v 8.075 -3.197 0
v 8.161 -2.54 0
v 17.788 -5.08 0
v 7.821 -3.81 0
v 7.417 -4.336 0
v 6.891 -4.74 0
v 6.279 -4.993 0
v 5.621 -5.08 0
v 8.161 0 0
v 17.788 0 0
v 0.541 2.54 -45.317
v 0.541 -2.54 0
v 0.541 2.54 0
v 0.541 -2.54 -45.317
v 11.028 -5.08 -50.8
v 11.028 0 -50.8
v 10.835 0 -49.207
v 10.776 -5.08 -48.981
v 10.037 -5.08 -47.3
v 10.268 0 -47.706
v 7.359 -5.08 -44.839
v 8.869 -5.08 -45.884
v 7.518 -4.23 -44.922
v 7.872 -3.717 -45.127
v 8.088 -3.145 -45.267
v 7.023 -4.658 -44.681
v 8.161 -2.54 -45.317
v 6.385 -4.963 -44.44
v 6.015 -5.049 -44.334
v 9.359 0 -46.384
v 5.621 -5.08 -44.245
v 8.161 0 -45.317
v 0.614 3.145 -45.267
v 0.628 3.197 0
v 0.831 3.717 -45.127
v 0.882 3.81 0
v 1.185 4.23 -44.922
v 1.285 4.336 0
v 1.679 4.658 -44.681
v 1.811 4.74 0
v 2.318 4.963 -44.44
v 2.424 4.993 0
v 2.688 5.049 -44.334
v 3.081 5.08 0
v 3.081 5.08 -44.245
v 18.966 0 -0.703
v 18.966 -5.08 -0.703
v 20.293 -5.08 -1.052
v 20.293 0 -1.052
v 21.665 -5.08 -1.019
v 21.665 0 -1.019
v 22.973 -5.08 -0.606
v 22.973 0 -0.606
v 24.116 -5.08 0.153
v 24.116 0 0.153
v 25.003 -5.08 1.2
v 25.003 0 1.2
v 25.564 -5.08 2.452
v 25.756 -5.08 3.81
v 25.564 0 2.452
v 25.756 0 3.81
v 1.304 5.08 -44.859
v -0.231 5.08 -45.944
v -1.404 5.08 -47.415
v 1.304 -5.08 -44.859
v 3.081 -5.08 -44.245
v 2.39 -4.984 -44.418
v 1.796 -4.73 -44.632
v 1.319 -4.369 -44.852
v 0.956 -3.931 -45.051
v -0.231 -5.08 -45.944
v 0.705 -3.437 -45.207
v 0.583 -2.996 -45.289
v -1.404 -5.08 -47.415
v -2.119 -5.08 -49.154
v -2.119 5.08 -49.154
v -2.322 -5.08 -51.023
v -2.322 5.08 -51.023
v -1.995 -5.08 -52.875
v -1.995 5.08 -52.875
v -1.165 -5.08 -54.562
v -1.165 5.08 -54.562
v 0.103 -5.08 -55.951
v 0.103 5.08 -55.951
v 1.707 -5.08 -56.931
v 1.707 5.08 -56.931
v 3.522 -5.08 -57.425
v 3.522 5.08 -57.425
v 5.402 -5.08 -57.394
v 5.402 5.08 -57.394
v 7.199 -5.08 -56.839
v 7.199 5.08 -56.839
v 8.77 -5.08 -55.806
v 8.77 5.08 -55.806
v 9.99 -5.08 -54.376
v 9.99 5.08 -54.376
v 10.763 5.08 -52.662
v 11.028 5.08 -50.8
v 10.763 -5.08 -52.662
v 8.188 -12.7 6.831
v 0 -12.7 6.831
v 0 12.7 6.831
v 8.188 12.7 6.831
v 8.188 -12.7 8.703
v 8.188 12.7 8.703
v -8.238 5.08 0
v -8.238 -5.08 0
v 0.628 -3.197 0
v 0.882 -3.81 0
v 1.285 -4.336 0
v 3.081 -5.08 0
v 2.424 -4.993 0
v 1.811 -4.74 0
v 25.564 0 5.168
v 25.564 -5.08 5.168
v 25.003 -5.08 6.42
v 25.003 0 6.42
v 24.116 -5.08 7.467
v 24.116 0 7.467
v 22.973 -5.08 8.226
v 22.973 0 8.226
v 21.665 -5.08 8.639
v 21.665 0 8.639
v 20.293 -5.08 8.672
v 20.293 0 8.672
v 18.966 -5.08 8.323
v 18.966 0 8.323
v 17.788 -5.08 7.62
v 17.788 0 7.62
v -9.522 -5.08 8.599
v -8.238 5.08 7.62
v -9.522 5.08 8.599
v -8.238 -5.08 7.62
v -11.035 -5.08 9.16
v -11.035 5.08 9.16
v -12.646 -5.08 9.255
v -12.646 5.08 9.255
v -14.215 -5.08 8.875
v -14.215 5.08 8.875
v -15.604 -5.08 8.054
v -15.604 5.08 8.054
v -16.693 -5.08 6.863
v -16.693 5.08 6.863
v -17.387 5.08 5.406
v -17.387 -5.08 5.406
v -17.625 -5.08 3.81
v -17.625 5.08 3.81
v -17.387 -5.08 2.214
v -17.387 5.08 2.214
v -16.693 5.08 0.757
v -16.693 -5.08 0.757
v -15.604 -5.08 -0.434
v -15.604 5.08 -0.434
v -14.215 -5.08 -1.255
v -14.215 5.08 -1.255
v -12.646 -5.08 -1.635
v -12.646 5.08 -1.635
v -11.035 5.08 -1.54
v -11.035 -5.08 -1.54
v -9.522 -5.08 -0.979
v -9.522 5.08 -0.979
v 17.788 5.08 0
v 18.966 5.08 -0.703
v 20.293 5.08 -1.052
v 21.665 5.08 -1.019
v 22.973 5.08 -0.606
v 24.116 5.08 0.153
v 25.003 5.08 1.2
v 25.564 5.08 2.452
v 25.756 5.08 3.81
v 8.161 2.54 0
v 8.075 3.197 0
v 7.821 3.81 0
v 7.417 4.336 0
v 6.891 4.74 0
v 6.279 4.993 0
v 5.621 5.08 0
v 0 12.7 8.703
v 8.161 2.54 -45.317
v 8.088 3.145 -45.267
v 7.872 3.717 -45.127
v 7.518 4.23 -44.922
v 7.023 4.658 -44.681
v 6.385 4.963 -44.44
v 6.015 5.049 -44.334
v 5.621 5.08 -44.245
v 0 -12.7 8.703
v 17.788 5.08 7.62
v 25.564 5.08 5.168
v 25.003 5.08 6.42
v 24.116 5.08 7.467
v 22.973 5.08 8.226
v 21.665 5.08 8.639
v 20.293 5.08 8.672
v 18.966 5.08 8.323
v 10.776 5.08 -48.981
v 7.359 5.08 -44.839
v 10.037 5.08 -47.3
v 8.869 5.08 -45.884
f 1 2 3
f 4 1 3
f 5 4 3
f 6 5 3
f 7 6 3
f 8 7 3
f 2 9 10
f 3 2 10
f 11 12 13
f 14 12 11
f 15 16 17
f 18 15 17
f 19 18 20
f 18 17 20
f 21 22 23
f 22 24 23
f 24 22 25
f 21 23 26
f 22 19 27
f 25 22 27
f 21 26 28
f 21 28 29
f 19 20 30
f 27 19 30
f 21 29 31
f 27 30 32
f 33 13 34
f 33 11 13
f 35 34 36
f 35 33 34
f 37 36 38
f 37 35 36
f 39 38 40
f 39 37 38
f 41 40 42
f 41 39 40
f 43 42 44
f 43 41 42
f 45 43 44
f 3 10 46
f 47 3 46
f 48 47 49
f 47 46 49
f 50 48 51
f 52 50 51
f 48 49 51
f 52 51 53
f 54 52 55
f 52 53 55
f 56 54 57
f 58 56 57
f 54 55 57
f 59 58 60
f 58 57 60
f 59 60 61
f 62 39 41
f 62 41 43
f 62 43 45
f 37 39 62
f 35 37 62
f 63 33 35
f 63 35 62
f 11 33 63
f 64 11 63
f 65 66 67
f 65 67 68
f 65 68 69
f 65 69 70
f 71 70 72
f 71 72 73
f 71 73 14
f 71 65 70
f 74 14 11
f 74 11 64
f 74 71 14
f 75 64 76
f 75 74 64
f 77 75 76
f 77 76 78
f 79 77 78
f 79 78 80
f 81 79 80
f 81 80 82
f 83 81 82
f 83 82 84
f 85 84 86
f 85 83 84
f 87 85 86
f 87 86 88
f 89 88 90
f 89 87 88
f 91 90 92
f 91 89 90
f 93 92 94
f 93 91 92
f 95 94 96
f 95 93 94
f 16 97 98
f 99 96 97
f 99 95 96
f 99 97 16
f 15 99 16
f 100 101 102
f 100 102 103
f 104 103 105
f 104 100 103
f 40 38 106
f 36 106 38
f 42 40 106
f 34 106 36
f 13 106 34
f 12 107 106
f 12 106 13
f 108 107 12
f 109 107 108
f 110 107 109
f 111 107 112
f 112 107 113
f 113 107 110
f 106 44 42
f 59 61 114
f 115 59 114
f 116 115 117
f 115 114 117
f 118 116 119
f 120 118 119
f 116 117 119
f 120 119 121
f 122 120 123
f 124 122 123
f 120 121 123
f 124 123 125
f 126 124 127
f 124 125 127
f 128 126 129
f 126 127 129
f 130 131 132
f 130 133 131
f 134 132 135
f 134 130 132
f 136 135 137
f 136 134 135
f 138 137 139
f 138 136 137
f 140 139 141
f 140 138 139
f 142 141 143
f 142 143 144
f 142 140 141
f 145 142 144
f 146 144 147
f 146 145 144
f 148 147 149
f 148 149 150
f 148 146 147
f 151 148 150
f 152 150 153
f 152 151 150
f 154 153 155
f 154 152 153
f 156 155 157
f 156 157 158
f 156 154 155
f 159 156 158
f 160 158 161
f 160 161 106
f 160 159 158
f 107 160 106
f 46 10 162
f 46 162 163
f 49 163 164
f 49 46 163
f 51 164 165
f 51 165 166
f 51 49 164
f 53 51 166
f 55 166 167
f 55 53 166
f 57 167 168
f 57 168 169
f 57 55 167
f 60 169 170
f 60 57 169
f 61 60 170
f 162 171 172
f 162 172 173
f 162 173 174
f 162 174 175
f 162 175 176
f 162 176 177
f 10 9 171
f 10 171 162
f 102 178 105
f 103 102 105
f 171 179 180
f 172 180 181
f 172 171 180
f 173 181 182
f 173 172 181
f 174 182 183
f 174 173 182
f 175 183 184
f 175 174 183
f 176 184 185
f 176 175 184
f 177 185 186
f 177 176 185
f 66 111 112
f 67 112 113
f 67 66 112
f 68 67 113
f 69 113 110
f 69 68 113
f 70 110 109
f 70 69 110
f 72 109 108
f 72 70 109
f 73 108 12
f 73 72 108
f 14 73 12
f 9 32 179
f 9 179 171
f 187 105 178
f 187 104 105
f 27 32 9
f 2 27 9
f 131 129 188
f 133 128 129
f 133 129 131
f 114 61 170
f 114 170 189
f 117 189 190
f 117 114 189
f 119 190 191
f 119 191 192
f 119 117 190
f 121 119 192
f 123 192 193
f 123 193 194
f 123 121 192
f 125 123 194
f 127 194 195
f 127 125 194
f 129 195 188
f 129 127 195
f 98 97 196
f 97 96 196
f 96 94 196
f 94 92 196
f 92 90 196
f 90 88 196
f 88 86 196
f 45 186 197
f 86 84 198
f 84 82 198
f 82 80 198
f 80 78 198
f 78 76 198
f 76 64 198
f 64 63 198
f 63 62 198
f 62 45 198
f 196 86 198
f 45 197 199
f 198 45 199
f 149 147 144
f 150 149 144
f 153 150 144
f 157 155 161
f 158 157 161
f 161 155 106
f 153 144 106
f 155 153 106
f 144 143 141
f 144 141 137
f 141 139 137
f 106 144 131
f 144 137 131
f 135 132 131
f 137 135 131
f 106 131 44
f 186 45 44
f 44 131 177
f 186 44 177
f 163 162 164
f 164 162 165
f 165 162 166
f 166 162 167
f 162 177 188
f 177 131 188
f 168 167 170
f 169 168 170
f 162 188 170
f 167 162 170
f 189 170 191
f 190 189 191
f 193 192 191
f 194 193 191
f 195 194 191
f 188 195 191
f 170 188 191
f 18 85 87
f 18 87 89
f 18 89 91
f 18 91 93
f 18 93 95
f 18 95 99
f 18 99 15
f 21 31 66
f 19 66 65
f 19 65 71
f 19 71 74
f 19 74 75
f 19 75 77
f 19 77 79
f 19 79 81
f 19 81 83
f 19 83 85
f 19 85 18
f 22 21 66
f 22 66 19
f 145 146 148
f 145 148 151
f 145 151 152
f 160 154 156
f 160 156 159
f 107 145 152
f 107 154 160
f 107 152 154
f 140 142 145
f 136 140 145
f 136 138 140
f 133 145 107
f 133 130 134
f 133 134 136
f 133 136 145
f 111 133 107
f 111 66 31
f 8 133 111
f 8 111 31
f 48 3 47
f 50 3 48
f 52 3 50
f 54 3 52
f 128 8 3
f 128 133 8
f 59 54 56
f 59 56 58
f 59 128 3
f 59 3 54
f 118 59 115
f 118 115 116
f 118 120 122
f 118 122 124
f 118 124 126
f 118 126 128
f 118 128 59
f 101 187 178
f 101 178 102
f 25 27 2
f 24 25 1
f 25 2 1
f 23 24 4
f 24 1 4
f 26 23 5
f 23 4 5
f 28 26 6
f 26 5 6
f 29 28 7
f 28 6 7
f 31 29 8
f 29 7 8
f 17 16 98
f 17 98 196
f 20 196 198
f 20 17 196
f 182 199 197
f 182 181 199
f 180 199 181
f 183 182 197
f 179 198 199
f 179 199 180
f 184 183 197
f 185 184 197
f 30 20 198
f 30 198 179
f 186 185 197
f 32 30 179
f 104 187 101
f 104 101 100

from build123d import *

# Parameters (mm, degrees)
F1_DEPTH = 5.08
F2_R     = 2.54
F4_DEPTH = 12.7


with BuildPart() as f1:
    # F0 (on Front) → F1 (new body, symmetric)
    with BuildSketch(Plane.XZ):
        with BuildLine():
            Line((-8.2382504713, 0), (0.5414021805, 0))
            Line((0.5414021805, 0), (8.1614021805, 0))
            Line((8.1614021805, 0), (17.7880630044, 0))
            ThreePointArc((17.7880630044, 0), (15.9663522633, 3.81), (17.7880630044, 7.62))
            Line((17.7880630044, 7.62), (-8.2382504713, 7.62))
            ThreePointArc((-8.2382504713, 7.62), (-7.0931889129, 5.8659318907), (-6.6918599137, 3.81))
            ThreePointArc((-6.6918599137, 3.81), (-7.0931889129, 1.7540681093), (-8.2382504713, 0))
        make_face()
        with BuildLine():
            Line((8.1614021805, 0), (0.5414021805, 0))
            Line((0.5414021805, 0), (0.5414021805, -45.3169520795))
            ThreePointArc((0.5414021805, -45.3169520795), (4.3514021805, -44.1231808098), (8.1614021805, -45.3169520795))
            Line((8.1614021805, -45.3169520795), (8.1614021805, 0))
        make_face()
        with BuildLine():
            ThreePointArc((8.1614021805, -45.3169520795), (4.3514021805, -44.1231808098), (0.5414021805, -45.3169520795))
            Line((0.5414021805, -45.3169520795), (0.5414021805, -50.8))
            Line((0.5414021805, -50.8), (8.1614021805, -50.8))
            Line((8.1614021805, -50.8), (8.1614021805, -45.3169520795))
        make_face()
        with BuildLine():
            Line((0.5414021805, -50.8), (0.5414021805, -45.3169520795))
            ThreePointArc((0.5414021805, -45.3169520795), (1.2577608483, -56.716865539), (11.0282213707, -50.8))
            ThreePointArc((11.0282213707, -50.8), (10.2682677195, -47.7063586679), (8.1614021805, -45.3169520795))
            Line((8.1614021805, -45.3169520795), (8.1614021805, -50.8))
            Line((8.1614021805, -50.8), (0.5414021805, -50.8))
        make_face()
        with BuildLine():
            ThreePointArc((-8.2382504713, 7.62), (-17.6253357253, 3.81), (-8.2382504713, 0))
            Line((-8.2382504713, 0), (-12.1585978195, 0))
            Line((-12.1585978195, 0), (-12.1585978195, 7.62))
            Line((-12.1585978195, 7.62), (-8.2382504713, 7.62))
        make_face()
        with BuildLine():
            Line((-12.1585978195, 0), (-8.2382504713, 0))
            ThreePointArc((-8.2382504713, 0), (-7.0931889129, 1.7540681093), (-6.6918599137, 3.81))
            ThreePointArc((-6.6918599137, 3.81), (-7.0931889129, 5.8659318907), (-8.2382504713, 7.62))
            Line((-8.2382504713, 7.62), (-12.1585978195, 7.62))
            Line((-12.1585978195, 7.62), (-12.1585978195, 0))
        make_face()
        with BuildLine():
            ThreePointArc((17.7880630044, 7.62), (15.9663522633, 3.81), (17.7880630044, 0))
            Line((17.7880630044, 0), (20.8614021805, 0))
            Line((20.8614021805, 0), (20.8614021805, 7.62))
            Line((20.8614021805, 7.62), (17.7880630044, 7.62))
        make_face()
        with BuildLine():
            Line((20.8614021805, 0), (17.7880630044, 0))
            ThreePointArc((17.7880630044, 0), (22.9729614399, -0.6062009902), (25.7564520977, 3.81))
            ThreePointArc((25.7564520977, 3.81), (22.9729614399, 8.2262009902), (17.7880630044, 7.62))
            Line((17.7880630044, 7.62), (20.8614021805, 7.62))
            Line((20.8614021805, 7.62), (20.8614021805, 0))
        make_face()
    extrude(amount=F1_DEPTH, both=True)

    # F2
    f2_edges = [f1.edges().sort_by_distance(p)[0] for p in [
        (8.161402, -5.08, -22.658476),
        (0.541402, -5.08, -22.658476),
        (0.541402, 5.08, -22.658476),
        (8.161402, 5.08, -22.658476),
    ]]
    fillet(f2_edges, radius=F2_R)


with BuildPart() as f4:
    # F3 (on Front) → F4 (new body, symmetric)
    with BuildSketch(Plane.XZ):
        Polygon((8.1881596717, 8.5223685753), (8.1881596717, 8.7033780292), (0, 8.7033780292), align=None)
        Polygon((8.1881596717, 6.8313037045), (8.1881596717, 8.5223685753), (0, 8.7033780292), (0, 6.8313037045), align=None)
    extrude(amount=F4_DEPTH, both=True)


solid = Compound([f1.part, f4.part])
